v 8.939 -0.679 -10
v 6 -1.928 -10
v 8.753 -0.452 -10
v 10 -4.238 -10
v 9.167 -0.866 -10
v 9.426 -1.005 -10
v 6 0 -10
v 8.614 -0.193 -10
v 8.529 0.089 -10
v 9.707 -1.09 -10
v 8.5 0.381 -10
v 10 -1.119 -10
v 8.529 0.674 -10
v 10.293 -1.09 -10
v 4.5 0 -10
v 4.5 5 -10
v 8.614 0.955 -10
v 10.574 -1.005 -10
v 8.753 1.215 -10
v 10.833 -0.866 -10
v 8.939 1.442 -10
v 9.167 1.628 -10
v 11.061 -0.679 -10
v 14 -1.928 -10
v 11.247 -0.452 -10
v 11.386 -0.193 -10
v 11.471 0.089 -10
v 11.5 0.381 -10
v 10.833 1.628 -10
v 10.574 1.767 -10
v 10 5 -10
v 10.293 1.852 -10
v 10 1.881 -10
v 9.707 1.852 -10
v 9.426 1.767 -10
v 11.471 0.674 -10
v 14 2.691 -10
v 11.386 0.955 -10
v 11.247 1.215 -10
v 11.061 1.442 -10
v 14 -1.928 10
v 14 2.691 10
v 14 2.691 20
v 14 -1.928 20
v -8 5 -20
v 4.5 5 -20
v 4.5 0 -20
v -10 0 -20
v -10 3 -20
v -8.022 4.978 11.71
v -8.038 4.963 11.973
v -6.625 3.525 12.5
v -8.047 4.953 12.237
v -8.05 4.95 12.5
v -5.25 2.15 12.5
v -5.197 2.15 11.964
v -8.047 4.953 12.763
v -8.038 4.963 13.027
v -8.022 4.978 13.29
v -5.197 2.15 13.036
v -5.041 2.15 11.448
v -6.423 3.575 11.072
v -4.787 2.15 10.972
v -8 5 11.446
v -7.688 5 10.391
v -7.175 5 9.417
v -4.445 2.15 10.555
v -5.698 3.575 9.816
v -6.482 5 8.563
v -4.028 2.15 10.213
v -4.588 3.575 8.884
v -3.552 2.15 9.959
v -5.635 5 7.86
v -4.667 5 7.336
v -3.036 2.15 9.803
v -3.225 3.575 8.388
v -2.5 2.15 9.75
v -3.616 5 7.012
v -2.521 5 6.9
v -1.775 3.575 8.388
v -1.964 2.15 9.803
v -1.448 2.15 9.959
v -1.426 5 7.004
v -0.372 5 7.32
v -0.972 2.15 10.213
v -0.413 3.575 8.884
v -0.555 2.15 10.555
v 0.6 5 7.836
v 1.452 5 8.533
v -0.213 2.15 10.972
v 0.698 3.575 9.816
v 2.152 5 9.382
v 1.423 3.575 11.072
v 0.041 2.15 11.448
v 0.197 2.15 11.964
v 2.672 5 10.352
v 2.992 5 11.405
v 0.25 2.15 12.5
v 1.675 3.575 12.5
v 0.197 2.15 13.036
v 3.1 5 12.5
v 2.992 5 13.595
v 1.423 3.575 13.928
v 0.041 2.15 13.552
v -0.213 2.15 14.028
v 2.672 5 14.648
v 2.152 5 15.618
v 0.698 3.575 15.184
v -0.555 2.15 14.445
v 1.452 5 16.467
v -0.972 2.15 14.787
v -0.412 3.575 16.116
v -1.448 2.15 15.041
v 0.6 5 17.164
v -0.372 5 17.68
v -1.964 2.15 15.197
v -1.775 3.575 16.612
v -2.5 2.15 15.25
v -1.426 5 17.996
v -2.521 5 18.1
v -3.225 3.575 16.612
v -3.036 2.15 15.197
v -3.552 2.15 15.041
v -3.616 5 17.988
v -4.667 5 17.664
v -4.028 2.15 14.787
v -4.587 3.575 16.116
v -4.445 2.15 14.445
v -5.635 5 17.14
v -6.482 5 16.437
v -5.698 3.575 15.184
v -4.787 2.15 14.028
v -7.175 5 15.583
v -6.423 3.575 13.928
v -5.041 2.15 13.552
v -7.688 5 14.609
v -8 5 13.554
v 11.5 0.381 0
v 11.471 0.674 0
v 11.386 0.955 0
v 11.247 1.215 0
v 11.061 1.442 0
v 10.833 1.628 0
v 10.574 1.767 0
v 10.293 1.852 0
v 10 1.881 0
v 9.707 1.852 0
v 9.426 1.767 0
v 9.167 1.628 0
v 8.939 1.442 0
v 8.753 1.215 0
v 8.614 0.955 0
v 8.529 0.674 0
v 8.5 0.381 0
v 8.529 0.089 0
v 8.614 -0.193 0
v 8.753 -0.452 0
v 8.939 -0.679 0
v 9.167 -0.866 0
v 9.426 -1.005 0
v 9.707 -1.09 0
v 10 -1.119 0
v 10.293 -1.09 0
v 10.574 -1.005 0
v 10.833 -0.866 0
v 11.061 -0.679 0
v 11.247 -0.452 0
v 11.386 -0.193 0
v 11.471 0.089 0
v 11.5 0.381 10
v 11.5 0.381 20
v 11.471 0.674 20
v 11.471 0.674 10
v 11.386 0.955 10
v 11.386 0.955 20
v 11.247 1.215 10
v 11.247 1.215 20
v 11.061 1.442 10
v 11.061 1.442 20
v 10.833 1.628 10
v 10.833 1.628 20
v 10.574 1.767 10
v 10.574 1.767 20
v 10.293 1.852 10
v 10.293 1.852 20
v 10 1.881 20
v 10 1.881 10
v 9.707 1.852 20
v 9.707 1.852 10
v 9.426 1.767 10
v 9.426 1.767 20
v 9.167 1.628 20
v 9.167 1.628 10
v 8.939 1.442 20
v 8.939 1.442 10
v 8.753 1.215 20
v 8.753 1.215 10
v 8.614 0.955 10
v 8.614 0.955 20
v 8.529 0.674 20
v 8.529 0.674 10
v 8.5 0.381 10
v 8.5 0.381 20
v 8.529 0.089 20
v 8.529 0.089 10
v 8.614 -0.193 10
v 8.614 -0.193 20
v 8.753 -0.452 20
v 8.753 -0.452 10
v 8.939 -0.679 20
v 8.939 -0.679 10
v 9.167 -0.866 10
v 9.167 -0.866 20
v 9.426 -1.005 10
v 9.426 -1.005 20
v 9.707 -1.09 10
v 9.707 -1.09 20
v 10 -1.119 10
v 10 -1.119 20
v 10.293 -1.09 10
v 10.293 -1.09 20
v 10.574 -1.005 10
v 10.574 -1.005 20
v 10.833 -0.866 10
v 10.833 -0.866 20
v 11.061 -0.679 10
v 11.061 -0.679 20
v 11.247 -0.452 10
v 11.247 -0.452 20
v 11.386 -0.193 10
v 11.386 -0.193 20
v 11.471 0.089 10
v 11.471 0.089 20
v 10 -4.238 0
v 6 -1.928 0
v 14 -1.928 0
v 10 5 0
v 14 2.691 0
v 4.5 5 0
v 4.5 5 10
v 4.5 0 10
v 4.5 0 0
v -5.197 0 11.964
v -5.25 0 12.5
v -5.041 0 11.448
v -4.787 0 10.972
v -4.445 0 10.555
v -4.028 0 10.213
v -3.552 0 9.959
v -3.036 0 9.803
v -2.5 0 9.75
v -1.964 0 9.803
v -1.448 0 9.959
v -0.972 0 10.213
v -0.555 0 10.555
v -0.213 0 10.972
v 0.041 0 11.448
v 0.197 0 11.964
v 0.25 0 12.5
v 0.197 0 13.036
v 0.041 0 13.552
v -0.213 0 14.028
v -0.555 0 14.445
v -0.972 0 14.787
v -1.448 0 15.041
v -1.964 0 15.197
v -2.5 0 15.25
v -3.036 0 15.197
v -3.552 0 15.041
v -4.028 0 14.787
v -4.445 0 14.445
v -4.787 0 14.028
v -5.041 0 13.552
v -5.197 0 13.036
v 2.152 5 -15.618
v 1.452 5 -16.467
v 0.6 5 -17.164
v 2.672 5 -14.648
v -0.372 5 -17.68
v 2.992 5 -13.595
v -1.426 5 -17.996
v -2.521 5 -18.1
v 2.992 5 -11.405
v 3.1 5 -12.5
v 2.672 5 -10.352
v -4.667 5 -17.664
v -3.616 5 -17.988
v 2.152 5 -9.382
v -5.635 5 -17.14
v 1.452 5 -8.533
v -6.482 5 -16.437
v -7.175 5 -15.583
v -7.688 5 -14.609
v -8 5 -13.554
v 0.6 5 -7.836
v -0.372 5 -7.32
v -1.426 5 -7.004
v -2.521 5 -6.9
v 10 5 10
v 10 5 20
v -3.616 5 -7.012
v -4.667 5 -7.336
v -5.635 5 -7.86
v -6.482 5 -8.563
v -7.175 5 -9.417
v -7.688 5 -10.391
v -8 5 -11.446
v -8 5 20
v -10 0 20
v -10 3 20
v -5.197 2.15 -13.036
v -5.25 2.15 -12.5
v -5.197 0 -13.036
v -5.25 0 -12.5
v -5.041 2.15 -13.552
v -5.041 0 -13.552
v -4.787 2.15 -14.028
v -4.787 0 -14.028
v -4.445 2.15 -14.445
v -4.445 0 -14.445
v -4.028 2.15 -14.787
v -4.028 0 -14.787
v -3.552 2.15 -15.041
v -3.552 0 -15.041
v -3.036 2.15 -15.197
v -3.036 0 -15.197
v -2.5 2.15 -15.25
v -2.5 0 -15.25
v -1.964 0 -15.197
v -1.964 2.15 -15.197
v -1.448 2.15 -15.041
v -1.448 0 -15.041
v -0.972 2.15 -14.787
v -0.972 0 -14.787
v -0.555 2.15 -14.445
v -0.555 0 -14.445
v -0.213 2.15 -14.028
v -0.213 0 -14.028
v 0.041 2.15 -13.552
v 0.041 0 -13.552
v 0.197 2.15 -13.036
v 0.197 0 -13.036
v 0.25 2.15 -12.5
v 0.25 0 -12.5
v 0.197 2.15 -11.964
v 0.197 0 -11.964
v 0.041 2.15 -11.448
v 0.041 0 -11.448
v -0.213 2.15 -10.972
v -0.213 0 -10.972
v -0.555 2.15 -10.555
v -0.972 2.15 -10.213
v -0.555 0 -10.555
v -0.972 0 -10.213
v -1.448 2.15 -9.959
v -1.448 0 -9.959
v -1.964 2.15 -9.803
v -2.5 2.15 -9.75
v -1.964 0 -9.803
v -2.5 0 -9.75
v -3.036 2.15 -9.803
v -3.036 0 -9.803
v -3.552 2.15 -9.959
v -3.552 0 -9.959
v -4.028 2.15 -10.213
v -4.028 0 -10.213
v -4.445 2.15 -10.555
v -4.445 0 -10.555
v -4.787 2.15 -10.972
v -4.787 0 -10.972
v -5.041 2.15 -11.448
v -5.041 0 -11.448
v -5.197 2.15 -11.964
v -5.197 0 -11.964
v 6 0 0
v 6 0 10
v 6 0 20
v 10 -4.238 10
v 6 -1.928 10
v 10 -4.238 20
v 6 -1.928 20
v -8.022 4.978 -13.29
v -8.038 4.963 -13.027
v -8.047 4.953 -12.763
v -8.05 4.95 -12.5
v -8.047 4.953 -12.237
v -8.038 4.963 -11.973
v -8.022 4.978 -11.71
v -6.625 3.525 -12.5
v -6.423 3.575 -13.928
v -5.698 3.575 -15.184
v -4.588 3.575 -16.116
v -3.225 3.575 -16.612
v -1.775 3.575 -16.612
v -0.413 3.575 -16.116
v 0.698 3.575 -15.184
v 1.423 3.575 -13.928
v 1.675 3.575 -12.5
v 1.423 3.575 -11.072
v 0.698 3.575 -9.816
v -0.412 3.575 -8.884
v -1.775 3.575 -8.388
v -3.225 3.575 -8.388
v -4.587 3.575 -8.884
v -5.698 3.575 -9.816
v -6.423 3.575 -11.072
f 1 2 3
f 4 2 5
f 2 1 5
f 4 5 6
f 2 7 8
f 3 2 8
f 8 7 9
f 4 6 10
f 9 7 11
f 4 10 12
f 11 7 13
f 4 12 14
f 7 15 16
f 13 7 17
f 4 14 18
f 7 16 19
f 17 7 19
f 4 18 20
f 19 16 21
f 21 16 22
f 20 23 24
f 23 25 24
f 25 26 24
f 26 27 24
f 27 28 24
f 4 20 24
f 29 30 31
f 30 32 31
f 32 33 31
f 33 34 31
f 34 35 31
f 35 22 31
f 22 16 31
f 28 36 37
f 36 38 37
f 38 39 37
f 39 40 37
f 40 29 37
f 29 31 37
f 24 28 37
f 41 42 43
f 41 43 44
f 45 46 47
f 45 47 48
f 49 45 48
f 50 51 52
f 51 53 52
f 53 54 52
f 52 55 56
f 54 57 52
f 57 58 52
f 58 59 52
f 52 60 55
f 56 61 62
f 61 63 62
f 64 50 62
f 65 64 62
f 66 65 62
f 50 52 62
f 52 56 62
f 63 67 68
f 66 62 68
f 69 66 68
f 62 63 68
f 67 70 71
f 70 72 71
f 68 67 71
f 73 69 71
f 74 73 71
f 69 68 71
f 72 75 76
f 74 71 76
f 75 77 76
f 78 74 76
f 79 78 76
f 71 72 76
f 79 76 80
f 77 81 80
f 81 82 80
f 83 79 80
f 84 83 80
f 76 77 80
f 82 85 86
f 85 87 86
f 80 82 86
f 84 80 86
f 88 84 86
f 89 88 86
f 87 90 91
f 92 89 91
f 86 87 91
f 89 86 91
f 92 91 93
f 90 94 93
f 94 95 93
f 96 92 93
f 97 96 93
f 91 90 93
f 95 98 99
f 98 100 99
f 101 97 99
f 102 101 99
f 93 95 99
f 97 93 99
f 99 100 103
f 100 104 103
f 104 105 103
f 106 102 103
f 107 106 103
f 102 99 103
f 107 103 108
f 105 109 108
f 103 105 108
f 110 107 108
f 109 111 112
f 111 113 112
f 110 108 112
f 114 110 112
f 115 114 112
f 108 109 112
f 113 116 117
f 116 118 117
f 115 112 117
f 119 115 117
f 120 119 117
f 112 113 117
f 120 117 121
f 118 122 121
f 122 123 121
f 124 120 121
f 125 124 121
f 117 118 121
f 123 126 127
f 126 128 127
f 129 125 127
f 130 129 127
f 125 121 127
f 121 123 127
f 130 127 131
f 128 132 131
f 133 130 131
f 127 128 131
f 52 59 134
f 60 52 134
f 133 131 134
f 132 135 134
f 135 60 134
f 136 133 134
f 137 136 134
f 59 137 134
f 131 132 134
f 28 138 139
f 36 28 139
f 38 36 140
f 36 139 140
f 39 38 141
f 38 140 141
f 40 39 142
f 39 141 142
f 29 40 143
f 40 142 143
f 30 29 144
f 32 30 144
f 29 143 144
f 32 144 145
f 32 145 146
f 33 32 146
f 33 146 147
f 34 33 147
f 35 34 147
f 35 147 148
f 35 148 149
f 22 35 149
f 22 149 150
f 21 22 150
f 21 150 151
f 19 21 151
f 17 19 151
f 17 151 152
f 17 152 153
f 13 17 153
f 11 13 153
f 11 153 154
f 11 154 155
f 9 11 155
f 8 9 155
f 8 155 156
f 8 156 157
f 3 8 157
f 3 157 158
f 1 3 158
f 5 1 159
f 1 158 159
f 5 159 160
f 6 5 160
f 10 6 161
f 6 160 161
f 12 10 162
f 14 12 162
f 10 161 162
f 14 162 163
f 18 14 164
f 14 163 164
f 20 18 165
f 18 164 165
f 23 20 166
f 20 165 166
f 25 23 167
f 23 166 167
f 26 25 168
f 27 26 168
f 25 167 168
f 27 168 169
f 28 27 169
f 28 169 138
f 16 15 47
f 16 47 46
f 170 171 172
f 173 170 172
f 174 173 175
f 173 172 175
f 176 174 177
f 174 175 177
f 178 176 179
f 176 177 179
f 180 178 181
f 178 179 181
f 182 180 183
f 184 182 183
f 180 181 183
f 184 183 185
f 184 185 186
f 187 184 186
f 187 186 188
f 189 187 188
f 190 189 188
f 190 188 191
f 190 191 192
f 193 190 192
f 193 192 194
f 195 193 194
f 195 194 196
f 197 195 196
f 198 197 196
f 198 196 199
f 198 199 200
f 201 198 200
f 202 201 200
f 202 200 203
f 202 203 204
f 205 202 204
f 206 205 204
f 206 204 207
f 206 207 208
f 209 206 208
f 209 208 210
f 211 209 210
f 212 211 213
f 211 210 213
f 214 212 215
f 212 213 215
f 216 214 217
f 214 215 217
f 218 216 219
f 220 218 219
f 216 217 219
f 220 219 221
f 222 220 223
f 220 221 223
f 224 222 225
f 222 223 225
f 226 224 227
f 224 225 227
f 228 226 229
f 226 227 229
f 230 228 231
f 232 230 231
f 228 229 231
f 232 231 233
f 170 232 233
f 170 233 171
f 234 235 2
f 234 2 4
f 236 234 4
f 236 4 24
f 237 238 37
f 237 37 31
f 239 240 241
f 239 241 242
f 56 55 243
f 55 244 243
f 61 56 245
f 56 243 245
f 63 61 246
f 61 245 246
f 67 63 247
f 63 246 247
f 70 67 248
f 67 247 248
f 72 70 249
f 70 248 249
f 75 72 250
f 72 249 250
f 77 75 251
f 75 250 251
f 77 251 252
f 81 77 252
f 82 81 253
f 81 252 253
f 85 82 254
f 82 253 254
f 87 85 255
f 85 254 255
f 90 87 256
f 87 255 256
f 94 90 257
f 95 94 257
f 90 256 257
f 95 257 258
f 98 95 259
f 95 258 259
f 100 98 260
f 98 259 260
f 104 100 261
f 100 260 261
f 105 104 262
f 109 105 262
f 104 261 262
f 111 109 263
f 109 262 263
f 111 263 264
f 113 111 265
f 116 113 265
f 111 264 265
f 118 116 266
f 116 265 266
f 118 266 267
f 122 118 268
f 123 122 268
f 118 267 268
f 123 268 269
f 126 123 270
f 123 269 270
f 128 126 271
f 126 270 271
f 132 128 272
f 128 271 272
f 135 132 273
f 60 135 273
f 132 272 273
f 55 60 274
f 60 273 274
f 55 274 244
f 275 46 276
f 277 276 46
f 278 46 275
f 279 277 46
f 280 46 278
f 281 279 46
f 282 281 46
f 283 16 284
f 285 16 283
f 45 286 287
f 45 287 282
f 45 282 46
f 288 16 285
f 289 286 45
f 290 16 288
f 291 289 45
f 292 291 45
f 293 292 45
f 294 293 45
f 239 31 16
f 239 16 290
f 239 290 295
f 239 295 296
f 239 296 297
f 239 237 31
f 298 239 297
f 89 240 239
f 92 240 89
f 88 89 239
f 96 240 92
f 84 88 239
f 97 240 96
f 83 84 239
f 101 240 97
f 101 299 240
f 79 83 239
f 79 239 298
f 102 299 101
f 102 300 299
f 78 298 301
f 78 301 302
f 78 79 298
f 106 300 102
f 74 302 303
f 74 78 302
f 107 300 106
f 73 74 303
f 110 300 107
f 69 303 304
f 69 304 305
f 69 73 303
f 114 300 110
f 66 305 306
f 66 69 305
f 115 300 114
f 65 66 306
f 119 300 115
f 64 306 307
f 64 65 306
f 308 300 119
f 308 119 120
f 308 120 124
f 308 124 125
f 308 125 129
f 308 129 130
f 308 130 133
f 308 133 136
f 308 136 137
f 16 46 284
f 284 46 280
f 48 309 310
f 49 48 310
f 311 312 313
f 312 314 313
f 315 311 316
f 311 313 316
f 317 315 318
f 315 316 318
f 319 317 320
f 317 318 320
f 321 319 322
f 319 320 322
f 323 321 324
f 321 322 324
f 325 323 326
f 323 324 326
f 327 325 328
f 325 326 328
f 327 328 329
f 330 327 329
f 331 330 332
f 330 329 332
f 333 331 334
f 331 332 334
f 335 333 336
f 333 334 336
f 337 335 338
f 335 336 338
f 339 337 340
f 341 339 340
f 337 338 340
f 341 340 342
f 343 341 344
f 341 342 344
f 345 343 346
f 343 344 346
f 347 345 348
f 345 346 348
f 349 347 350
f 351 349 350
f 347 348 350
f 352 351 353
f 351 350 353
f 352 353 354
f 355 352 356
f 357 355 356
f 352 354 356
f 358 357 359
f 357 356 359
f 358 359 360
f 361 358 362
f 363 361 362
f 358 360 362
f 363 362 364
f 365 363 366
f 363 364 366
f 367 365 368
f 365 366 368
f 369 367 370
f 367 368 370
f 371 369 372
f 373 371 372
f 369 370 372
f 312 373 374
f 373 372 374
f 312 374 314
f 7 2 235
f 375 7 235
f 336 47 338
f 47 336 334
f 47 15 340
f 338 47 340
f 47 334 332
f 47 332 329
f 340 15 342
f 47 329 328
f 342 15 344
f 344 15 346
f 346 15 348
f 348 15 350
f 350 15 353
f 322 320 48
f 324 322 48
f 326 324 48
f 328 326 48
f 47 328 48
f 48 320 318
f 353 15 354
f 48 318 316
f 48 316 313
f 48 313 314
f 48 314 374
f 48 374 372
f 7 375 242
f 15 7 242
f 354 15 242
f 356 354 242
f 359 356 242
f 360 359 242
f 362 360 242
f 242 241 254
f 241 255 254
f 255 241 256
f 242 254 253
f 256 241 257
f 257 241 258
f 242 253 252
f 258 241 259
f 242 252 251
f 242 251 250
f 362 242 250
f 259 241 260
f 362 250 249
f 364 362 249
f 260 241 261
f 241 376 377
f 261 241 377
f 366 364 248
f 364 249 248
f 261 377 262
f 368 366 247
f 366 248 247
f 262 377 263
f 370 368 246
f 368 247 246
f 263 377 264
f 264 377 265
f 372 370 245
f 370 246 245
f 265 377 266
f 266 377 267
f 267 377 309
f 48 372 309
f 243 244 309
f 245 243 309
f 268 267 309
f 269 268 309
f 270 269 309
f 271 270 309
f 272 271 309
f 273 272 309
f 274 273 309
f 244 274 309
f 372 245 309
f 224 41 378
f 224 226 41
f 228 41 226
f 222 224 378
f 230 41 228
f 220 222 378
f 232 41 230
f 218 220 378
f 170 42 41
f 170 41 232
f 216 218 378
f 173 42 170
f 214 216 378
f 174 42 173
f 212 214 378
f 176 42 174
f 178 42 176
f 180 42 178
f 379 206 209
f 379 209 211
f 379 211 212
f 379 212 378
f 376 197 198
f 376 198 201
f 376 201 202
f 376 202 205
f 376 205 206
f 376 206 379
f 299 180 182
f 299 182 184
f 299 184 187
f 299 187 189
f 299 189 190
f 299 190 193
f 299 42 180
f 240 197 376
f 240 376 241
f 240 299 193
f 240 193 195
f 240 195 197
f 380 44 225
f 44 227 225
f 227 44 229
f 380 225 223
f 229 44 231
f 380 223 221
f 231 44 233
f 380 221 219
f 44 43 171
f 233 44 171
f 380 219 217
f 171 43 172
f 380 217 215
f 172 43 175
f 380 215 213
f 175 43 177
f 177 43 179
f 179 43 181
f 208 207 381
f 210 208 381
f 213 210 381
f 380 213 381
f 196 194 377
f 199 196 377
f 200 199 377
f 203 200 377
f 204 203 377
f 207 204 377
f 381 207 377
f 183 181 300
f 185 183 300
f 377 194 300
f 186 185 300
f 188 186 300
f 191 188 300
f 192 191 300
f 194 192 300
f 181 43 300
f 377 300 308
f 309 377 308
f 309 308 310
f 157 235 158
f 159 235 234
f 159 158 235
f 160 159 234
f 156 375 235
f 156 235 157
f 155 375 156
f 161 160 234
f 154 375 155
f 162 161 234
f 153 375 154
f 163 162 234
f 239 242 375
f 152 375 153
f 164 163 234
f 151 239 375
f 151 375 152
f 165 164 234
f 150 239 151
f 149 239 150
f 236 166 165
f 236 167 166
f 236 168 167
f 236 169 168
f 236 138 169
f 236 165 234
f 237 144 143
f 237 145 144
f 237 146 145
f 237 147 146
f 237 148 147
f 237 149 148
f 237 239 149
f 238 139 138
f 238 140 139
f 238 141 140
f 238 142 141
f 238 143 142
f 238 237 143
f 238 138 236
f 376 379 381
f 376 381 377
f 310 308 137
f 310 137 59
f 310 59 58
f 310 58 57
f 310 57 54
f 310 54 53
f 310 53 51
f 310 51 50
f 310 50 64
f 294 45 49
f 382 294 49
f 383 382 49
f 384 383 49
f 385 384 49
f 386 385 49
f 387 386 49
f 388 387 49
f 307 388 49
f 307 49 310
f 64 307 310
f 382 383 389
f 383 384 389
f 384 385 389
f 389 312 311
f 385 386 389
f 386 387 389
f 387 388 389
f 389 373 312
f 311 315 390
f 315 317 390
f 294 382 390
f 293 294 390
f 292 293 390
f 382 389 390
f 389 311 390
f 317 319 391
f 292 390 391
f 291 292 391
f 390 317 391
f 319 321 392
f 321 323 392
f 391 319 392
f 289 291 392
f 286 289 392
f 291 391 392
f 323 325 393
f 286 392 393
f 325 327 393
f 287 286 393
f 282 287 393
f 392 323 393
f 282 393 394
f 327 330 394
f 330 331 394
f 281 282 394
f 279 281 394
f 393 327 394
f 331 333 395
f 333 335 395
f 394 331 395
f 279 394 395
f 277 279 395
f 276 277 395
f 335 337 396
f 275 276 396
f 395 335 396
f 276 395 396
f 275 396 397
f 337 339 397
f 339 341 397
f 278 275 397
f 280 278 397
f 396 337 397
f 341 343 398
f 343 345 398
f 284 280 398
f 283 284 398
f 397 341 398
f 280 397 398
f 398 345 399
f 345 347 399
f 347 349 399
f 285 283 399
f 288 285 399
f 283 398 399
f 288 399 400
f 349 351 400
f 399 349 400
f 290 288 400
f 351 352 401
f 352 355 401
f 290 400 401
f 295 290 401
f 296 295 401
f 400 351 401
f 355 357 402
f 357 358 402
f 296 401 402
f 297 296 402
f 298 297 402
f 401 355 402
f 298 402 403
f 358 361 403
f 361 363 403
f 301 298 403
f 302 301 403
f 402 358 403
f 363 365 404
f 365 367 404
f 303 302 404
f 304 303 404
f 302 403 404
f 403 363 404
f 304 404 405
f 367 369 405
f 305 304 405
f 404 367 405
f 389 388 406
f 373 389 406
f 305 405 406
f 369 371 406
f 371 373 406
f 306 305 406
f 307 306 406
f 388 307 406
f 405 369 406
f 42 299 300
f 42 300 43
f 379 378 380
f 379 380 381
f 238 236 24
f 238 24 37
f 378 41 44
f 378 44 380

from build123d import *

# Parameters (mm, degrees)
EXTRUDE_1_DEPTH              = 10
SKETCH_2_W                   = 16
SKETCH_2_H                   = 6.92820323
EXTRUDE_2_DEPTH              = 10
SKETCH_3_W                   = 10
SKETCH_3_H                   = 6.92820323
CUT_EXTRUDE_1_DEPTH          = 1.5
CUT_EXTRUDE_2_DEPTH          = 1.92820323
EXTRUDE_3_DEPTH              = 10
SKETCH_6_W                   = 14.5
SKETCH_6_H                   = 5
EXTRUDE_4_DEPTH              = 10
HOLE_WIZARD_3_0_3_1_D        = 3
HOLE_WIZARD_3_0_3_1_DEPTH    = 10
HOLE_WIZARD_M5_1_D           = 5.5
HOLE_WIZARD_M5_1_DEPTH       = 9.237604307
HOLE_WIZARD_M5_1_CSINK_D     = 11.2
HOLE_WIZARD_M5_1_CSINK_ANGLE = 90
HOLE_WIZARD_3_0_3_2_D        = 3
HOLE_WIZARD_3_0_3_2_DEPTH    = 30
CHAMFER_1_SIZE               = 2


with BuildPart() as part:
    # 草图1 → 凸台-拉伸1 (new body)
    with BuildSketch(Plane.XY):
        Polygon((10, 5), (-10, 5), (-10, -1.92820323), (6, -1.92820323), (10, -4.237604307), (14, -1.92820323), (14, 2.690598923), align=None)
    extrude(amount=-EXTRUDE_1_DEPTH)

    # 草图2 → 凸台-拉伸2 (add)
    with BuildSketch(Plane.XY):
        with Locations((-2, 1.535898385)):
            Rectangle(SKETCH_2_W, SKETCH_2_H)
    extrude(amount=EXTRUDE_2_DEPTH)

    # 草图3 → 切除-拉伸1 (cut)
    with BuildSketch(Plane(origin=(6, 0, 0), x_dir=(0, 0, -1), z_dir=(1, 0, 0))):
        with Locations((-5, 1.535898385)):
            Rectangle(SKETCH_3_W, SKETCH_3_H)
    extrude(amount=-CUT_EXTRUDE_1_DEPTH, mode=Mode.SUBTRACT)

    # 草图4 → 切除-拉伸2 (cut)
    with BuildSketch(Plane.XZ.offset(1.92820323)):
        Polygon((4.5, 0), (4.5, 10), (-10, 10), (-10, -10), (6, -10), (6, 0), align=None)
    extrude(amount=-CUT_EXTRUDE_2_DEPTH, mode=Mode.SUBTRACT)

    # 草图5 → 凸台-拉伸3 (add)
    with BuildSketch(Plane.XY.offset(10)):
        Polygon((-10, 5), (10, 5), (14, 2.690598923), (14, -1.92820323), (10, -4.237604307), (6, -1.92820323), (6, 0), (-10, 0), align=None)
    extrude(amount=EXTRUDE_3_DEPTH)

    # 草图6 → 凸台-拉伸4 (add)
    with BuildSketch(Plane(origin=(0, 0, -10), x_dir=(-1, 0, 0), z_dir=(0, 0, -1))):
        with Locations((2.75, 2.5)):
            Rectangle(SKETCH_6_W, SKETCH_6_H)
    extrude(amount=EXTRUDE_4_DEPTH)

    # Ø3.0 (3) 直径孔1
    with Locations(Plane(origin=(0, 0, 10), x_dir=(-1, 0, 0), z_dir=(0, 0, -1))):
        with Locations((-10, 0.381197846)):
            Hole(HOLE_WIZARD_3_0_3_1_D / 2, depth=HOLE_WIZARD_3_0_3_1_DEPTH)

    # M5 平头机械螺钉的锥形沉头孔1
    with Locations(Plane(origin=(0, 5, 0), x_dir=(1, 0, 0), z_dir=(0, 1, 0))):
        with Locations((-2.5, 12.5), (-2.5, -12.5)):
            CounterSinkHole(HOLE_WIZARD_M5_1_D / 2, HOLE_WIZARD_M5_1_CSINK_D / 2, depth=HOLE_WIZARD_M5_1_DEPTH, counter_sink_angle=HOLE_WIZARD_M5_1_CSINK_ANGLE)

    # Ø3.0 (3) 直径孔2
    with Locations(Plane(origin=(0, 0, -10), x_dir=(-1, 0, 0), z_dir=(0, 0, -1))):
        with Locations((-10, 0.381197846)):
            Hole(HOLE_WIZARD_3_0_3_2_D / 2, depth=HOLE_WIZARD_3_0_3_2_DEPTH)

    # 倒角1
    # the kernel refuses this chamfer: 2 mm, written as the material it takes off along each edge
    with BuildSketch(Plane(origin=(-10, 5, -25.143365976), x_dir=(0.9996219169112968, 0.027495876610586487, 0), z_dir=(0, 0, 1))) as chamfer_1_piece_1:
        Polygon((CHAMFER_1_SIZE * 0.999621916911, -CHAMFER_1_SIZE * 0.0274958766106), (-CHAMFER_1_SIZE * 0.0274958766106, -CHAMFER_1_SIZE * 0.999621916911), (0, 0), align=None)
    extrude(amount=50.286731952, mode=Mode.SUBTRACT)


solid = part.part
